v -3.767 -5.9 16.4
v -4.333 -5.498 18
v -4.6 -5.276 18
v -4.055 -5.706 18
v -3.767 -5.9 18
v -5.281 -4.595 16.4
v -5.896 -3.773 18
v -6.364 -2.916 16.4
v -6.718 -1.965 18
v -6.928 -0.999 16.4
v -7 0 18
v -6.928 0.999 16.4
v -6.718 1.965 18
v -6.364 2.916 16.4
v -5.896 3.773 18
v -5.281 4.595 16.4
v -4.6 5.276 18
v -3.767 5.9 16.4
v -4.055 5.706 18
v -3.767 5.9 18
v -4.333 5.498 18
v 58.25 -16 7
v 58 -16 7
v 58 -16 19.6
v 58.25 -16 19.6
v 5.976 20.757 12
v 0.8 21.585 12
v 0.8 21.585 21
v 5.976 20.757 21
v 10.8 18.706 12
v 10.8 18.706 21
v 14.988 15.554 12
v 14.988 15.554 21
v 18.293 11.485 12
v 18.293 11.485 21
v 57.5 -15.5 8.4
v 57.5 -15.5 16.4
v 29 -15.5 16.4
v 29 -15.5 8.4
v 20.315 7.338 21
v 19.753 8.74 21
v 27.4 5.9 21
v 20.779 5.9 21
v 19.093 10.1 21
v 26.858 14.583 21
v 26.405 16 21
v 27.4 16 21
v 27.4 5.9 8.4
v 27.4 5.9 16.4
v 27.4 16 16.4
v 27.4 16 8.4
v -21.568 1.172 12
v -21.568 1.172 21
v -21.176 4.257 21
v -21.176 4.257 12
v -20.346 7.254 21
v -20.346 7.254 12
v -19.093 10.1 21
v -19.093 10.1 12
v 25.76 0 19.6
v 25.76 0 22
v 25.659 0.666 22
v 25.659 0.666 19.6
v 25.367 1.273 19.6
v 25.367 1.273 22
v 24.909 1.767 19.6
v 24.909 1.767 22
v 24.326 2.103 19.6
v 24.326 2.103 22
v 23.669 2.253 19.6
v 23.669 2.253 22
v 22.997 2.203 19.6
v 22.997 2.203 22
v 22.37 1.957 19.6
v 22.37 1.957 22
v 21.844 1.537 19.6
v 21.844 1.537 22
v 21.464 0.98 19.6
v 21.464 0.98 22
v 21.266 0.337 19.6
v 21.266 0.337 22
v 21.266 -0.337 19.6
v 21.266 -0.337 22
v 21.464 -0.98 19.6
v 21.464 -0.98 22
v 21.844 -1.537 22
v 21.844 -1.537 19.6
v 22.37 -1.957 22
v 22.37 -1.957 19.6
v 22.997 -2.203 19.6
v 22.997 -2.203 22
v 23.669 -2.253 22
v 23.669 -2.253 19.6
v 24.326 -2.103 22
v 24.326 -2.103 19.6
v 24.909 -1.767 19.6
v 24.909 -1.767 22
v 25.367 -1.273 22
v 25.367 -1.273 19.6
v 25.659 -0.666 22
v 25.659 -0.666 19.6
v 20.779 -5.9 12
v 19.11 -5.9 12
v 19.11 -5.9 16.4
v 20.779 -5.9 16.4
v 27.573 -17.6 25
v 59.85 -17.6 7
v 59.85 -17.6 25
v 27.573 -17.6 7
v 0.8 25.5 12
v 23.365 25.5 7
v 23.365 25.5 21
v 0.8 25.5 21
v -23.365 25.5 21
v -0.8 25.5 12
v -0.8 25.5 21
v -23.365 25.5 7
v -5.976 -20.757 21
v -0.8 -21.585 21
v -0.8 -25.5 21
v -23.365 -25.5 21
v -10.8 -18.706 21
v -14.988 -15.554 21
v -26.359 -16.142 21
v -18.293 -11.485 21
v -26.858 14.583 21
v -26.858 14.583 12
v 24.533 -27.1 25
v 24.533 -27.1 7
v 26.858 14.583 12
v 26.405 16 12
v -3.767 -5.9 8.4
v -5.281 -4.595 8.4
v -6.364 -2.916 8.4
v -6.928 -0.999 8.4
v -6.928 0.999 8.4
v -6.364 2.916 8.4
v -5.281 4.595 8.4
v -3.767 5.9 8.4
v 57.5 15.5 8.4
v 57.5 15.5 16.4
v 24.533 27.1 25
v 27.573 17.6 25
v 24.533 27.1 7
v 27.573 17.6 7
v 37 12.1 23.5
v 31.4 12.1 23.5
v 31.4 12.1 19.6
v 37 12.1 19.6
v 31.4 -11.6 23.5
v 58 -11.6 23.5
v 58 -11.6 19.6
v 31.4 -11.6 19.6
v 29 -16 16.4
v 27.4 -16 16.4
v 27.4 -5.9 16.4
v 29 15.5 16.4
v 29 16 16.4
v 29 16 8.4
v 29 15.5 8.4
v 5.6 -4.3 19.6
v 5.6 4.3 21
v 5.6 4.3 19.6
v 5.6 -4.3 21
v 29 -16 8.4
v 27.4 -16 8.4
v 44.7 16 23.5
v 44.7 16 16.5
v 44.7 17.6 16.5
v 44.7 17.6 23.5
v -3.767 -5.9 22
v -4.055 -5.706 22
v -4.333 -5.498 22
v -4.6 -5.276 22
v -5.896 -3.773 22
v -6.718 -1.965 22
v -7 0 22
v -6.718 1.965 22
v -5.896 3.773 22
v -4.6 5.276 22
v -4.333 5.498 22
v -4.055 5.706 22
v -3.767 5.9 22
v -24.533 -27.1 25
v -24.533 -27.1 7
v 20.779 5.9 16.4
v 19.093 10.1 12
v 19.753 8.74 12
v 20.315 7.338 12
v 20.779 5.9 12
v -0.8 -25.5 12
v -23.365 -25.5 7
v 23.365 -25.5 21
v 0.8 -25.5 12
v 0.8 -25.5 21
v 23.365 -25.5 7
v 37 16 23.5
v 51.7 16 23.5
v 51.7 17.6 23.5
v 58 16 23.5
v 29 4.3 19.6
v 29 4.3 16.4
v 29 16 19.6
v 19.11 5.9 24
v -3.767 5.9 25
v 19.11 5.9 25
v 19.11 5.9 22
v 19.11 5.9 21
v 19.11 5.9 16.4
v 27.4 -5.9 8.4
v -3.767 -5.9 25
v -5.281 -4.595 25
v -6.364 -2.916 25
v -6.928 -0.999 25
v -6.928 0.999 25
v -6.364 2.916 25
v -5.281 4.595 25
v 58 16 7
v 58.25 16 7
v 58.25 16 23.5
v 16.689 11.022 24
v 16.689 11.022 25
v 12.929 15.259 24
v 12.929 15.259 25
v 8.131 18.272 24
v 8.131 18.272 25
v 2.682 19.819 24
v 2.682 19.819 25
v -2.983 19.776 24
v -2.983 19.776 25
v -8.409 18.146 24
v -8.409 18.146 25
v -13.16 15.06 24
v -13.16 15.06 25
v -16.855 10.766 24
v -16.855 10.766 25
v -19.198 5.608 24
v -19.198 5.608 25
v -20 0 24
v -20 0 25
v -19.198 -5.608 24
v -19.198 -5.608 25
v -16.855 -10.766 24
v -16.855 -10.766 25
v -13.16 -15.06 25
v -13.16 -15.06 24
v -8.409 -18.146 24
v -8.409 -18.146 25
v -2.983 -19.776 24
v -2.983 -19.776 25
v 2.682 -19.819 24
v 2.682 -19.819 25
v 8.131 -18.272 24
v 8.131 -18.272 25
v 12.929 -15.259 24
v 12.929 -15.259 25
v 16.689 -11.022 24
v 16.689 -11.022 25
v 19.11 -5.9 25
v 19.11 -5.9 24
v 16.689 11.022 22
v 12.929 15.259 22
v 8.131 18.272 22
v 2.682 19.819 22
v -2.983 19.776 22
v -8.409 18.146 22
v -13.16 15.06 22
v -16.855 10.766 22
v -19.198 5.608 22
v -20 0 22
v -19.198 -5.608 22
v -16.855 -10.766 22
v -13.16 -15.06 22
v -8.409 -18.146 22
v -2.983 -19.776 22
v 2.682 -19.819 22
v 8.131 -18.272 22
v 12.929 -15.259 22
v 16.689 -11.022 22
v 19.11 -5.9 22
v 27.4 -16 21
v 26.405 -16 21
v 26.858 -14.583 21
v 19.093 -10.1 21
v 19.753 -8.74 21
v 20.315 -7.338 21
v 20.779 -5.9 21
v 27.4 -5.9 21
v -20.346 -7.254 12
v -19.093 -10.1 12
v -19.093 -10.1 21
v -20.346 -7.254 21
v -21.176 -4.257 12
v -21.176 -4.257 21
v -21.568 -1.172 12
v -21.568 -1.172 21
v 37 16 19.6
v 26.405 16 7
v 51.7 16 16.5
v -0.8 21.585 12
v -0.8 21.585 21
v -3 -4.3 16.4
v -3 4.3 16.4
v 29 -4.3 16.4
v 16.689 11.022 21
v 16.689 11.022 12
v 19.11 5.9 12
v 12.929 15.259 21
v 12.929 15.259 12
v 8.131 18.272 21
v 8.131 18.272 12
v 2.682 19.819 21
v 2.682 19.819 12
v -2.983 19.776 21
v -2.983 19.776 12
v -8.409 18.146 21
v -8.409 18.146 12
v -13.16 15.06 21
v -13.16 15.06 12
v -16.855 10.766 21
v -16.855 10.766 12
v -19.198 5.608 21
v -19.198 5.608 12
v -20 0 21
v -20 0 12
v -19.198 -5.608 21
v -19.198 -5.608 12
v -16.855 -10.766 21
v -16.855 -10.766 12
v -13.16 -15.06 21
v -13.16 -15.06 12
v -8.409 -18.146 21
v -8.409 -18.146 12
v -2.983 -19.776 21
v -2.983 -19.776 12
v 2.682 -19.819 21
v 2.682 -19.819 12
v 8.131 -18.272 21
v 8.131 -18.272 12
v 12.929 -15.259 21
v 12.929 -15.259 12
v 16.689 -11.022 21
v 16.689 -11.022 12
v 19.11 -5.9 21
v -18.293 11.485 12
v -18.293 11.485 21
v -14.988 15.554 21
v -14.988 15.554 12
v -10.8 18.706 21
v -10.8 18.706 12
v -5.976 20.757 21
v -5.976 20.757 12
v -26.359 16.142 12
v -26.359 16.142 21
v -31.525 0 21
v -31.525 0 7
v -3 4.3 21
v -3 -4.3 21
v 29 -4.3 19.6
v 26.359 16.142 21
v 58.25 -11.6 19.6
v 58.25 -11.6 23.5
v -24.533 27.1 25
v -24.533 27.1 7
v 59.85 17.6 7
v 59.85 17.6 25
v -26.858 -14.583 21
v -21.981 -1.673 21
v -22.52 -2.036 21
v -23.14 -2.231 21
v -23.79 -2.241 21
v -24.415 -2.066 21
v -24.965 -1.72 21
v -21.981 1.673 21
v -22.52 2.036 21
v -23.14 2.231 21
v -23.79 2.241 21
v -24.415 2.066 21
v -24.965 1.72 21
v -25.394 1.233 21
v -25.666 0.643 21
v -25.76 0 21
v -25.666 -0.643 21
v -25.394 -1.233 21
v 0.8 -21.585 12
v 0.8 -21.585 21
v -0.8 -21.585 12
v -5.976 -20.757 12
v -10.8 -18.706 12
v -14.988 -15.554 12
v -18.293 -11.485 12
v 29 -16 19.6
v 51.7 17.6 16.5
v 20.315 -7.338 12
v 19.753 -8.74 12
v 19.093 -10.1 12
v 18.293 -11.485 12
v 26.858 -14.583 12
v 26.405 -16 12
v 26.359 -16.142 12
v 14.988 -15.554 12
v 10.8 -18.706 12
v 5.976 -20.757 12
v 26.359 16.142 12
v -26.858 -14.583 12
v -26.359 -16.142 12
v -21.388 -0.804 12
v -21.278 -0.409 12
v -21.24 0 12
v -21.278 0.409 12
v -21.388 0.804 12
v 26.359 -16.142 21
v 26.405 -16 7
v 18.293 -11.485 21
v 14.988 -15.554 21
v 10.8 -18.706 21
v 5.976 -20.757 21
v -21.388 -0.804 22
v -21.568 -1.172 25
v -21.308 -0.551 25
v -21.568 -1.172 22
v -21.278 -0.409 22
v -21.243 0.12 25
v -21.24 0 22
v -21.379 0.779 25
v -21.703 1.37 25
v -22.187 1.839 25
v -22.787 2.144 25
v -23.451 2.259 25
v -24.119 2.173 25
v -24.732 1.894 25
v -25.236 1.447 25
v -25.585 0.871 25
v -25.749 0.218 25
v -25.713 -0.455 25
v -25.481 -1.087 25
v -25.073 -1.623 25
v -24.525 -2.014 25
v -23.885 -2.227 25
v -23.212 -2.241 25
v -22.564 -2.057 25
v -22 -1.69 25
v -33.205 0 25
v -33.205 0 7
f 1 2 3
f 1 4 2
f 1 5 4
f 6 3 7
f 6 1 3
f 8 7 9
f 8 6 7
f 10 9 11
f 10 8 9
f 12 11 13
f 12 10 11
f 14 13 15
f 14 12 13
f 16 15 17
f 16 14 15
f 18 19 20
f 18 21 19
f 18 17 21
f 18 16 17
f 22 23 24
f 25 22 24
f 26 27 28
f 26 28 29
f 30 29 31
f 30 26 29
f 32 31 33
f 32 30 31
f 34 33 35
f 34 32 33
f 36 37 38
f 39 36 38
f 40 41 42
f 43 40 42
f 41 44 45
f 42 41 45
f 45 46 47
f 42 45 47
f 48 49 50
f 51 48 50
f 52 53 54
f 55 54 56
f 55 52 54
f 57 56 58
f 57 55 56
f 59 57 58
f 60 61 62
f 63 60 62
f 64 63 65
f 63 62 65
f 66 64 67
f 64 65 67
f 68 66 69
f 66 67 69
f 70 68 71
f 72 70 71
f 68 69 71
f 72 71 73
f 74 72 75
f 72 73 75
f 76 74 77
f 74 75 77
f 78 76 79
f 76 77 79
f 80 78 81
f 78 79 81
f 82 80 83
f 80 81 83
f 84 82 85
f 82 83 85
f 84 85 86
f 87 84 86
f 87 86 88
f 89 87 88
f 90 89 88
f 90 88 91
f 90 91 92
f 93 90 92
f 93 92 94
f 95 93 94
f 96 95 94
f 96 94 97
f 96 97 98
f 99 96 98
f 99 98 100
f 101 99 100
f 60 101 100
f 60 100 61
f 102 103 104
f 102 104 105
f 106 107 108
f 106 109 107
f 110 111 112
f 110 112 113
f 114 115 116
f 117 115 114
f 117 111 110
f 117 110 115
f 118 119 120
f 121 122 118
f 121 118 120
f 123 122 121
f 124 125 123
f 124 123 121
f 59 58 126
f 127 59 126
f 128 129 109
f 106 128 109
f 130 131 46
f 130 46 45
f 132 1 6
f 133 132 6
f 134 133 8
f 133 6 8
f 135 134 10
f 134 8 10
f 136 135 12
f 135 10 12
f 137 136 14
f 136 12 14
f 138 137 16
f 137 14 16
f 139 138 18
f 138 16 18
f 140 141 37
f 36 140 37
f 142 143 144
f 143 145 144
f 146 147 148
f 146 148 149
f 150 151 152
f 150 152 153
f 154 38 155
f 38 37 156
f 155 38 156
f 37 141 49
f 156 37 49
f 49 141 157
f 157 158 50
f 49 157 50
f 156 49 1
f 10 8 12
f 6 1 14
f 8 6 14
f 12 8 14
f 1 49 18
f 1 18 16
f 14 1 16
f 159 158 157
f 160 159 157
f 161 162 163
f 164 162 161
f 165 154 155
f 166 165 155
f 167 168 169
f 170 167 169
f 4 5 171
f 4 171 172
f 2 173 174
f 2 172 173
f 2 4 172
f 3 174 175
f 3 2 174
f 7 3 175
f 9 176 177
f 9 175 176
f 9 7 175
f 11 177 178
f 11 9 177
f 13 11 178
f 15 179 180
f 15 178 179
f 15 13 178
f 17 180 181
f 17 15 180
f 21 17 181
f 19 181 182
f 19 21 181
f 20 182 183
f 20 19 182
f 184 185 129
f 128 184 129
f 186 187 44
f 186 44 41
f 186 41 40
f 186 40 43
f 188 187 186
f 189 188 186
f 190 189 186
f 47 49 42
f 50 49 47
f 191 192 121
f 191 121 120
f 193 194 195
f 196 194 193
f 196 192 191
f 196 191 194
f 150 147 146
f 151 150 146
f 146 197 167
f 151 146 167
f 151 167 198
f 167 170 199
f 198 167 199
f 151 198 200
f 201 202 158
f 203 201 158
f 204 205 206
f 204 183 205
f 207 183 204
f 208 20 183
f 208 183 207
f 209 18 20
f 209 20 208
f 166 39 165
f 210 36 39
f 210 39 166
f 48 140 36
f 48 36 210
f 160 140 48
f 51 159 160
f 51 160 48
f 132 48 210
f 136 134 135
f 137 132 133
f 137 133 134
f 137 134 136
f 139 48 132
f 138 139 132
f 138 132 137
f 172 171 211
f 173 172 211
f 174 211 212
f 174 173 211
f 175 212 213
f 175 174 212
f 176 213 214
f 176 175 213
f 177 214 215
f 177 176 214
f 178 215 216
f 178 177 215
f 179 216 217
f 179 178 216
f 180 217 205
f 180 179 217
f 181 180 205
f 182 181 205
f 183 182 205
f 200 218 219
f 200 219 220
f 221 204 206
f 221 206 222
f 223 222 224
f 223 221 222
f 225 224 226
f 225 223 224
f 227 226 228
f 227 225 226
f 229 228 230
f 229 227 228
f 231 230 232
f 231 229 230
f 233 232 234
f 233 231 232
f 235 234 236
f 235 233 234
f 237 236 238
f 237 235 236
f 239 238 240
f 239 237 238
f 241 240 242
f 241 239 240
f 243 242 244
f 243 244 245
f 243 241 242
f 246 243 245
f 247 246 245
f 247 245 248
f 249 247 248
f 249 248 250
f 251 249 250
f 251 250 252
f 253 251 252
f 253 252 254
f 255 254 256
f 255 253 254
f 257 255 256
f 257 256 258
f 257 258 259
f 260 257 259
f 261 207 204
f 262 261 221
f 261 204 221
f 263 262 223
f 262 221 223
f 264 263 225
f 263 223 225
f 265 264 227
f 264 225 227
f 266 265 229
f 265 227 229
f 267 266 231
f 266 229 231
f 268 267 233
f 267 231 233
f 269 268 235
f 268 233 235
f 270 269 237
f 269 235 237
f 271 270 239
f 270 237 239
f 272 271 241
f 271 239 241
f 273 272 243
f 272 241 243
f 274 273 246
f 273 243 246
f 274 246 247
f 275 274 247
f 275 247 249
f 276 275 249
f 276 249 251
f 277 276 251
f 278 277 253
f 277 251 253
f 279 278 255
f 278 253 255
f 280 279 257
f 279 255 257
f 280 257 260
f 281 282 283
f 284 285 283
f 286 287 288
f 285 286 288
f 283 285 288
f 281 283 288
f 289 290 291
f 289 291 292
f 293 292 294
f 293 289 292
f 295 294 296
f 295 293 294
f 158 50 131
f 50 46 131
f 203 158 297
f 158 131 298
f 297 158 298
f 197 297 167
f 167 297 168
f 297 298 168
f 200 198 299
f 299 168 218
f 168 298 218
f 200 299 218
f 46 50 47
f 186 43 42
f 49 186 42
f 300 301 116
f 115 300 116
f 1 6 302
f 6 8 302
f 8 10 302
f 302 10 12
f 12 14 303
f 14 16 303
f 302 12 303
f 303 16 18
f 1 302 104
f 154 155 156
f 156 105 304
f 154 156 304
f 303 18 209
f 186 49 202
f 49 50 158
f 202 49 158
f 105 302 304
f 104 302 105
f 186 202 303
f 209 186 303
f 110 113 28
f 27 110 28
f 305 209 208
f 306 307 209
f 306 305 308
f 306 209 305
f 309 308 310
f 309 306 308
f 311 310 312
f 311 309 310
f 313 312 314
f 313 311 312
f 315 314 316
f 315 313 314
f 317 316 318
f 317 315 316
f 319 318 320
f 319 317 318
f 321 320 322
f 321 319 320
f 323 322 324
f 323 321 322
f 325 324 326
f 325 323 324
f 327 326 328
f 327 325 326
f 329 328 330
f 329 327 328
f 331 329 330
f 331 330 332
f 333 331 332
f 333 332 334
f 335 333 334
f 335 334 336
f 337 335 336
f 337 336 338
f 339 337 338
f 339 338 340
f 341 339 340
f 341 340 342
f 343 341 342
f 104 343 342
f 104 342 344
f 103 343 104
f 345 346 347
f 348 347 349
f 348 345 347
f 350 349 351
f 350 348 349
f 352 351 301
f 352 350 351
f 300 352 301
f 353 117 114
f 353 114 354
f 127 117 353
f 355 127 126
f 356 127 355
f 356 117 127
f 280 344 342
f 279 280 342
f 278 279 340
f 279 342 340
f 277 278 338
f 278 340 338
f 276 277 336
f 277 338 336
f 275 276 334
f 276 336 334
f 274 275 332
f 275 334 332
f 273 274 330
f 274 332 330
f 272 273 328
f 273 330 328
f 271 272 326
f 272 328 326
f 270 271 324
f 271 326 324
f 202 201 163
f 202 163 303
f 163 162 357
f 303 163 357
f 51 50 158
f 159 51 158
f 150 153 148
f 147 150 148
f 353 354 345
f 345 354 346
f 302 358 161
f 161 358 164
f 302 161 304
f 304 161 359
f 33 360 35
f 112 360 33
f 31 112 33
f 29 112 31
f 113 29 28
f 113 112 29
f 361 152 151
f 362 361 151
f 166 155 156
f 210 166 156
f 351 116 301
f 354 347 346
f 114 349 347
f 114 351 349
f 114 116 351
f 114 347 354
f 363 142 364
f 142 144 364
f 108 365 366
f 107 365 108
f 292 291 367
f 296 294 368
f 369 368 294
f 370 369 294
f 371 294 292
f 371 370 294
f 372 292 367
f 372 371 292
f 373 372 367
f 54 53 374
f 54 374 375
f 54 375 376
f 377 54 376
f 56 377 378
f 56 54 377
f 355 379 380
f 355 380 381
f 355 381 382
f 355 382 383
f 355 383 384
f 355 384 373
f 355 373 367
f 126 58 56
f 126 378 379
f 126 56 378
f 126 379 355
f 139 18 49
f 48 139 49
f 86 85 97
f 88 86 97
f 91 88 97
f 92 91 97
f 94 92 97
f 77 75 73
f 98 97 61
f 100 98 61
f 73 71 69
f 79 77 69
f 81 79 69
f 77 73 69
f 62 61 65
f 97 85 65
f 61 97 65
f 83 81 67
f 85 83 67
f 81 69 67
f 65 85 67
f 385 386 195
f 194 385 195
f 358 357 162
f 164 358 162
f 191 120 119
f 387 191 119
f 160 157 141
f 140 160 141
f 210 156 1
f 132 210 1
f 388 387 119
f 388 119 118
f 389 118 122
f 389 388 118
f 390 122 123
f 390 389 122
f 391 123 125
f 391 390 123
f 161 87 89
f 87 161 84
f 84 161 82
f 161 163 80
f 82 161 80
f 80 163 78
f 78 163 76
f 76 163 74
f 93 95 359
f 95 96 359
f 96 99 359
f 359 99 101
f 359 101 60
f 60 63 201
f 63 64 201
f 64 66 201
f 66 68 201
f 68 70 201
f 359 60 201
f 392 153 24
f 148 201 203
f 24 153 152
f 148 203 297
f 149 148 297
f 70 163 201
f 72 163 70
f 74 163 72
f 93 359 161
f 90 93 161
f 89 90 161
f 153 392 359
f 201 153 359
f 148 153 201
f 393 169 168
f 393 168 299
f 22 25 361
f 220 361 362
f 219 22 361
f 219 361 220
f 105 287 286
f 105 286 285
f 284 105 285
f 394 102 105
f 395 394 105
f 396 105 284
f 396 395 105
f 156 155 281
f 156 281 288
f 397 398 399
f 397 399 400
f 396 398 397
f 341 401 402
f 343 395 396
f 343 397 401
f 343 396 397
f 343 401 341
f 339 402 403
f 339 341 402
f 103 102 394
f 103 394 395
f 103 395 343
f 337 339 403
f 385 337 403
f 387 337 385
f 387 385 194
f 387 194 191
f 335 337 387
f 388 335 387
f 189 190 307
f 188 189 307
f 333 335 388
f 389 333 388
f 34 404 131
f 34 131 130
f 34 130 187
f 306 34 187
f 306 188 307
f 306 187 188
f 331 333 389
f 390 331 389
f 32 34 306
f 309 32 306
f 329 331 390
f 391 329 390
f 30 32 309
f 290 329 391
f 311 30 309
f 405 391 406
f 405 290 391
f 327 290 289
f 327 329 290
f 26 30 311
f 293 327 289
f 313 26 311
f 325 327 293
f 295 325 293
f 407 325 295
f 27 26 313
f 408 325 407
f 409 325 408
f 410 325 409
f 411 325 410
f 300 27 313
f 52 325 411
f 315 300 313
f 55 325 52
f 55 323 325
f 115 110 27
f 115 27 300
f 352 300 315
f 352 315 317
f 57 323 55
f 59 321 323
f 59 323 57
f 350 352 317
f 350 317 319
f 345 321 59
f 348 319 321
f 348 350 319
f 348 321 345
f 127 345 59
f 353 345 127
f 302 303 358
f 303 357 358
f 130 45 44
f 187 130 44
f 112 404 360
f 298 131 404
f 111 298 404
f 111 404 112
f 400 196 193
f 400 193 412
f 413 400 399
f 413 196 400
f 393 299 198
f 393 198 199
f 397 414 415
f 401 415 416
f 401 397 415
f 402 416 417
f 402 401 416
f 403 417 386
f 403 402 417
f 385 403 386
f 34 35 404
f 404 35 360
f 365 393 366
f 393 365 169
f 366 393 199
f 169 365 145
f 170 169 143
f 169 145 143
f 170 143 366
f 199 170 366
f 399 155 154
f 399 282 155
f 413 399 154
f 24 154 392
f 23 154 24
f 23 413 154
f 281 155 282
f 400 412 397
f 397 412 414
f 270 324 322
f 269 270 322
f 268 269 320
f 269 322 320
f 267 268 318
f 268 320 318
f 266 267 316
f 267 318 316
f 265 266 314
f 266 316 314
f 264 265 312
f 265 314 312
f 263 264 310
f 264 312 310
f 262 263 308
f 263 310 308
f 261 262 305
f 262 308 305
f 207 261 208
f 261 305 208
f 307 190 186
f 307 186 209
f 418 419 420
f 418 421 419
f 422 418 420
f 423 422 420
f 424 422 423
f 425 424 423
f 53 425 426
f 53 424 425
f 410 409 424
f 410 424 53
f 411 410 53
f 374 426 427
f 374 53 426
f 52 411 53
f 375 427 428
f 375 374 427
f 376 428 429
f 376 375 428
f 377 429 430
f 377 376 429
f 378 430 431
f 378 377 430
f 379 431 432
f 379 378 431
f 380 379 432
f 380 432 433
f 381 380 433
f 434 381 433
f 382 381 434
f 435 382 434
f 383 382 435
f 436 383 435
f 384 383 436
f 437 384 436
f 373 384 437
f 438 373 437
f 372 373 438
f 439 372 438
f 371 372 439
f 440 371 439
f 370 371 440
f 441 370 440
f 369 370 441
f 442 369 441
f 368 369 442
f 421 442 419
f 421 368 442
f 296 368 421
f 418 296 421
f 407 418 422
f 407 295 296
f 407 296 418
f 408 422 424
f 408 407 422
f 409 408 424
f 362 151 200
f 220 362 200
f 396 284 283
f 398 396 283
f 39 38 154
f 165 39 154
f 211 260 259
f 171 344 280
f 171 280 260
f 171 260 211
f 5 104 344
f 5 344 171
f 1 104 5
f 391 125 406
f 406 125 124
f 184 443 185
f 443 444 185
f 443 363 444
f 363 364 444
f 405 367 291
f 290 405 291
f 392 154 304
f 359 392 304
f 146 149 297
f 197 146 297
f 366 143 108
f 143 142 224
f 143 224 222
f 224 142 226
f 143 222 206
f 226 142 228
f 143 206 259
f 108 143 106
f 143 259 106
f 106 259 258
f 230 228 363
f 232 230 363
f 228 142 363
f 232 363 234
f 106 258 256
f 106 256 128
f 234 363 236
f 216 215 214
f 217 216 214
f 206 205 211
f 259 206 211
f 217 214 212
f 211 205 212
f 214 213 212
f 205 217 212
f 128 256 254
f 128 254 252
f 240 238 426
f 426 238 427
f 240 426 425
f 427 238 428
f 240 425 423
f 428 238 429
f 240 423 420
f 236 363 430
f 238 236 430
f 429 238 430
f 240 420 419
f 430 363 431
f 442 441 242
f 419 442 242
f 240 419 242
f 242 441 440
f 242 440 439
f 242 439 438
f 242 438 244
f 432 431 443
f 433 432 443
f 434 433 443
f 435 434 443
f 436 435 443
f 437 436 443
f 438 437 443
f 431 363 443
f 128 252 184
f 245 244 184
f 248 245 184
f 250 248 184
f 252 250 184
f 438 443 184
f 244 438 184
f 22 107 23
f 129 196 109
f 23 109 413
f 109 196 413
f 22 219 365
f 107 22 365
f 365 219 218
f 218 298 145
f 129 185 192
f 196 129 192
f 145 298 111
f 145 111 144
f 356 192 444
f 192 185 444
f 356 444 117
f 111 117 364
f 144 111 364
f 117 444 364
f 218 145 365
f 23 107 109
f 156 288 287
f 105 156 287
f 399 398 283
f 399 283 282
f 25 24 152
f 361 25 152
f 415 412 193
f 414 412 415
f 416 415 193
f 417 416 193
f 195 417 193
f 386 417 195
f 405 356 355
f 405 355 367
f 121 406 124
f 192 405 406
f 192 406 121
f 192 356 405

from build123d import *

# Parameters (mm, degrees)
BOSS_EXTRUDE1_DEPTH      = 10
BOSS_EXTRUDE1_DEPTH_BACK = 5
BOSS_EXTRUDE2_DEPTH      = 15
CUT_EXTRUDE1_DEPTH       = 68.168221653
BOSS_EXTRUDE3_DEPTH      = 4
SKETCH7_R                = 1.75
BOSS_EXTRUDE4_DEPTH      = 2.4
SKETCH8_R                = 3.5
BOSS_EXTRUDE5_DEPTH      = 1
CUT_EXTRUDE2_DEPTH       = 10
BOSS_EXTRUDE7_START      = 14
BOSS_EXTRUDE7_DEPTH      = 14
RIB9_START               = -9
RIB9_DEPTH               = 9
CUT_EXTRUDE3_DEPTH       = 5
SKETCH18_R               = 2.259673145
CUT_EXTRUDE4_DEPTH       = 68.168221653
SKETCH20_R               = 3.5
SKETCH20_W               = 8.6
SKETCH20_H               = 8.6
BOSS_EXTRUDE8_DEPTH      = 1
SKETCH21_W               = 7
SKETCH21_H               = 1.6
CUT_EXTRUDE5_DEPTH       = 7
BOSS_EXTRUDE11_DEPTH     = 2
SKETCH25_W               = 26.6
SKETCH25_H               = 26.1
BOSS_EXTRUDE12_DEPTH     = 1
BOSS_EXTRUDE13_DEPTH     = 4
CUT_EXTRUDE6_START       = -4
CUT_EXTRUDE6_DEPTH       = 4
BOSS_EXTRUDE14_DEPTH     = 1.6
BOSS_EXTRUDE16_START     = 2
SKETCH30_R               = 2.259673145
BOSS_EXTRUDE16_DEPTH     = 2
MOVE_FACE2_BY            = 2.8
MOVE_FACE2_2_BY          = 2.8
MOVE_START               = 14.5
MOVE_FACE3_OUTLINE_W     = 7
MOVE_FACE3_OUTLINE_H     = 1.5
MOVE_FACE3_DEPTH         = 1.6
MOVE_FACE3_2_OUTLINE_W   = 7
MOVE_FACE3_2_OUTLINE_H   = 1.5
MOVE_FACE3_2_DEPTH       = 1.6
MOVE_START_2             = 7
MOVE_FACE4_OUTLINE_W     = 29
MOVE_FACE4_OUTLINE_H     = 1.5
MOVE_FACE4_DEPTH         = 12.6
MOVE_START_3             = 19.6
MOVE_FACE4_2_OUTLINE_W   = 7.7
MOVE_FACE4_2_OUTLINE_H   = 1.5
MOVE_FACE4_2_OUTLINE_W_2 = 6.3
MOVE_FACE4_2_DEPTH       = 3.4
MOVE_FACE4_3_OUTLINE_W   = 1.6
MOVE_FACE4_3_OUTLINE_H   = 1.5
MOVE_FACE4_3_DEPTH       = 9.4
MOVE_FACE4_4_DEPTH       = 1.4
MOVE_FACE4_5_OUTLINE_W   = 7.9
MOVE_FACE4_5_OUTLINE_H   = 1.5
MOVE_FACE4_5_DEPTH       = 17
MOVE_FACE4_6_OUTLINE_W   = 7
MOVE_FACE4_6_OUTLINE_H   = 1.5
MOVE_FACE4_6_DEPTH       = 9.5
MOVE_START_4             = 23.5
MOVE_FACE4_7_OUTLINE_W   = 7
MOVE_FACE4_7_OUTLINE_H   = 1.5
MOVE_FACE4_7_DEPTH       = 0.5
MOVE_FACE6_OUTLINE_W     = 29
MOVE_FACE6_OUTLINE_H     = 1.5
MOVE_FACE6_DEPTH         = 12.6
MOVE_FACE6_2_OUTLINE_W   = 1.6
MOVE_FACE6_2_OUTLINE_H   = 1.5
MOVE_FACE6_2_DEPTH       = 9.4
MOVE_FACE6_3_DEPTH       = 1.4
MOVE_FACE6_4_DEPTH       = 17
BOSS_EXTRUDE17_DEPTH     = 8
MOVE_START_5             = 31.4
MOVE_FACE8_OUTLINE_W     = 23.7
MOVE_FACE8_OUTLINE_H     = 0.5
MOVE_FACE8_DEPTH         = 26.6
MOVE_START_6             = 37
MOVE_FACE8_2_OUTLINE_W   = 3.9
MOVE_FACE8_2_OUTLINE_H   = 0.5
MOVE_FACE8_2_DEPTH       = 21
MOVE_FACE9_BY            = 1
MOVE_FACE10_BY           = 0.25
MOVE_FACE10_2_BY         = 0.25


# Read off the part's stored shape, not the designer's step: Rib9, Move Face3, Move Face4, Move Face6, Move Face8
with BuildPart() as part:
    # Sketch2 → Boss-Extrude1 (new, two sides: drawn at the far end of the back side and taken through both)
    with BuildSketch(Plane.XY.offset(12).offset(-BOSS_EXTRUDE1_DEPTH_BACK)):
        Polygon((-24.532899998, 27.1), (-33.204899998, 0), (-24.532899998, -27.1), (24.532899998, -27.1), (33.204899998, 0), (24.532899998, 27.1), align=None)
        Polygon((-23.36497619, 25.5), (-31.52497619, 0), (-23.36497619, -25.5), (23.36497619, -25.5), (31.52497619, 0), (23.36497619, 25.5), align=None, mode=Mode.SUBTRACT)
    extrude(amount=BOSS_EXTRUDE1_DEPTH + BOSS_EXTRUDE1_DEPTH_BACK)

    # Sketch3 → Boss-Extrude2 (add)
    with BuildSketch(Plane.XY.offset(22)):
        Polygon((29.5, 16.1), (59.6, 16.1), (59.6, -16.1), (29.5, -16.1), (28.052899998, -16.1), (28.564899998, -14.5), (29.5, -14.5), (58, -14.5), (58, 14.5), (29.5, 14.5), (28.564899998, 14.5), (28.052899998, 16.1), align=None)
    extrude(amount=-BOSS_EXTRUDE2_DEPTH)

    # Sketch4 → Cut-Extrude1 (cut, through all)
    with BuildSketch(Plane(origin=(0, 0, 7), x_dir=(-1, 0, 0), z_dir=(0, 0, -1))):
        Polygon((-26.88497619, 14.5), (-28.564899998, 14.5), (-33.204899998, 0), (-28.564899998, -14.5), (-26.88497619, -14.5), (-31.52497619, 0), align=None)
    extrude(amount=-CUT_EXTRUDE1_DEPTH, mode=Mode.SUBTRACT)

    # Sketch5 → Boss-Extrude3 (add)
    with BuildSketch(Plane.XY.offset(22)):
        Polygon((29, 4.3), (29, 14), (29, 14.5), (27.4, 14.5), (27.4, 14), (27.4, 5.9), (-4.6, 5.9), (-4.6, -5.9), (27.4, -5.9), (27.4, -14), (27.4, -14.5), (29, -14.5), (29, -14), (29, -4.3), (-3, -4.3), (-3, 4.3), align=None)
    extrude(amount=-BOSS_EXTRUDE3_DEPTH)

    # Sketch7 → Boss-Extrude4 (add)
    with BuildSketch(Plane.XY.offset(22)):
        Polygon((37, 12.1), (37, 14.5), (29, 14.5), (29, 4.3), (5.6, 4.3), (5.6, -4.3), (29, -4.3), (29, -14.5), (58, -14.5), (58, -11.6), (31.4, -11.6), (31.4, 12.1), align=None)
        with Locations((23.5, 0)):
            Circle(SKETCH7_R, mode=Mode.SUBTRACT)
    extrude(amount=-BOSS_EXTRUDE4_DEPTH)

    # Sketch8 → Boss-Extrude5 (add)
    with BuildSketch(Plane.XY.offset(22)):
        Polygon((27.4, -5.9), (27.4, -14.5), (26.88497619, -14.5), (23.36497619, -25.5), (-23.36497619, -25.5), (-31.52497619, 0), (-23.36497619, 25.5), (23.36497619, 25.5), (26.88497619, 14.5), (27.4, 14.5), (27.4, 5.9), (-4.6, 5.9), (-4.6, -5.9), align=None)
        with Locations((-18.25, 18.25)):
            Circle(SKETCH8_R, mode=Mode.SUBTRACT)
        with Locations((18.25, 18.25)):
            Circle(SKETCH8_R, mode=Mode.SUBTRACT)
        with Locations((18.25, -18.25)):
            Circle(SKETCH8_R, mode=Mode.SUBTRACT)
        with Locations((-18.25, -18.25)):
            Circle(SKETCH8_R, mode=Mode.SUBTRACT)
    extrude(amount=-BOSS_EXTRUDE5_DEPTH)

    # Sketch11 → Cut-Extrude2 (cut)
    with BuildSketch(Plane(origin=(0, 0, 21), x_dir=(-1, 0, 0), z_dir=(0, 0, -1))):
        with BuildLine():
            Line((4.6, -5.9), (-19.109945055, -5.9))
            ThreePointArc((-19.109945055, -5.9), (2.983378865, -19.776234489), (20, 0))
            ThreePointArc((20, 0), (2.983378865, 19.776234489), (-19.109945055, 5.9))
            Line((-19.109945055, 5.9), (4.6, 5.9))
            Line((4.6, 5.9), (4.6, -5.9))
        make_face()
    extrude(amount=-CUT_EXTRUDE2_DEPTH, mode=Mode.SUBTRACT)

    # Sketch12 → Boss-Extrude7 (add)
    with BuildSketch(Plane(origin=(0, 0, 21), x_dir=(-1, 0, 0), z_dir=(0, 0, -1)).offset(BOSS_EXTRUDE7_START)):
        with BuildLine():
            ThreePointArc((21.6, 0), (2.978452055, 21.393663159), (-20.778594755, 5.9))
            Line((-20.778594755, 5.9), (-19.109945055, 5.9))
            ThreePointArc((-19.109945055, 5.9), (20, 0), (-19.109945055, -5.9))
            Line((-19.109945055, -5.9), (-20.778594755, -5.9))
            ThreePointArc((-20.778594755, -5.9), (2.978452055, -21.393663159), (21.6, 0))
        make_face()
    extrude(amount=-BOSS_EXTRUDE7_DEPTH)

    # Rib9 outline → Rib9 (add)
    with BuildSketch(Plane(origin=(0, 0, 12), x_dir=(-1, 0, 0), z_dir=(0, 0, -1)).offset(RIB9_START)):
        with BuildLine():
            ThreePointArc((-0.8, 21.585180101), (0, 21.6), (0.8, 21.585180101))
            Line((0.8, 21.585180101), (0.8, 25.5))
            Line((0.8, 25.5), (-0.8, 25.5))
            Line((-0.8, 25.5), (-0.8, 21.585180101))
        make_face()
        with BuildLine():
            Line((26.359415795, 16.142376235), (18.293314313, 11.485410374))
            ThreePointArc((18.293314313, 11.485410374), (18.706148722, 10.8), (19.093314313, 10.099769728))
            Line((19.093314313, 10.099769728), (26.85842878, 14.582960656))
            Line((26.85842878, 14.582960656), (26.359415795, 16.142376235))
        make_face()
        with BuildLine():
            ThreePointArc((-19.093314313, 10.099769728), (-18.706148721, 10.8), (-18.293314313, 11.485410374))
            Line((-18.293314313, 11.485410374), (-26.359415795, 16.142376235))
            Line((-26.359415795, 16.142376235), (-26.85842878, 14.582960656))
            Line((-26.85842878, 14.582960656), (-19.093314313, 10.099769728))
        make_face()
        with BuildLine():
            Line((26.85842878, -14.582960656), (19.093314313, -10.099769728))
            ThreePointArc((19.093314313, -10.099769728), (18.706148722, -10.8), (18.293314313, -11.485410374))
            Line((18.293314313, -11.485410374), (26.359415795, -16.142376235))
            Line((26.359415795, -16.142376235), (26.85842878, -14.582960656))
        make_face()
        with BuildLine():
            Line((0.8, -25.5), (0.8, -21.585180101))
            ThreePointArc((0.8, -21.585180101), (0, -21.6), (-0.8, -21.585180101))
            Line((-0.8, -21.585180101), (-0.8, -25.5))
            Line((-0.8, -25.5), (0.8, -25.5))
        make_face()
        with BuildLine():
            Line((-26.359415795, -16.142376235), (-18.293314313, -11.485410374))
            ThreePointArc((-18.293314313, -11.485410374), (-18.706148721, -10.8), (-19.093314313, -10.099769728))
            Line((-19.093314313, -10.099769728), (-26.85842878, -14.582960656))
            Line((-26.85842878, -14.582960656), (-26.359415795, -16.142376235))
        make_face()
    extrude(amount=RIB9_DEPTH)

    # Sketch17 → Cut-Extrude3 (cut)
    with BuildSketch(Plane(origin=(0, 0, 7), x_dir=(-1, 0, 0), z_dir=(0, 0, -1))):
        with BuildLine():
            Line((-19.109945055, -5.9), (-20.778594755, -5.9))
            ThreePointArc((-20.778594755, -5.9), (21.6, 0), (-20.778594755, 5.9))
            Line((-20.778594755, 5.9), (-19.109945055, 5.9))
            ThreePointArc((-19.109945055, 5.9), (20, 0), (-19.109945055, -5.9))
        make_face()
    extrude(amount=-CUT_EXTRUDE3_DEPTH, mode=Mode.SUBTRACT)

    # Sketch18 → Cut-Extrude4 (cut, through all)
    with BuildSketch(Plane.XY.offset(22)):
        with Locations((-23.5, 0)):
            Circle(SKETCH18_R)
        with Locations((23.5, 0)):
            Circle(SKETCH18_R)
    extrude(amount=-CUT_EXTRUDE4_DEPTH, mode=Mode.SUBTRACT)

    # Sketch20 → Boss-Extrude8 (add)
    with BuildSketch(Plane.XY.offset(22)):
        with Locations((18.25, 18.25)):
            Circle(SKETCH20_R)
        with Locations((18.25, -18.25)):
            Circle(SKETCH20_R)
        with Locations((-18.25, -18.25)):
            Circle(SKETCH20_R)
        with Locations((-18.25, 18.25)):
            Circle(SKETCH20_R)
        with Locations((1.3, 0)):
            Rectangle(SKETCH20_W, SKETCH20_H)
    extrude(amount=-BOSS_EXTRUDE8_DEPTH)

    # Sketch21 → Cut-Extrude5 (cut)
    with BuildSketch(Plane.XY.offset(22)):
        with Locations((51, 15.3)):
            Rectangle(SKETCH21_W, SKETCH21_H)
    extrude(amount=-CUT_EXTRUDE5_DEPTH, mode=Mode.SUBTRACT)

    # Sketch26 → Boss-Extrude13 (add)
    with BuildSketch(Plane.XY.offset(22)):
        with BuildLine():
            ThreePointArc((-7, 0), (-6.371812929, -2.898275349), (-4.6, -5.276362383))
            Line((-4.6, -5.276362383), (-4.6, 0))
            Line((-4.6, 0), (-7, 0))
        make_face()
        with BuildLine():
            Line((-7, 0), (-4.6, 0))
            Line((-4.6, 0), (-4.6, 5.276362383))
            ThreePointArc((-4.6, 5.276362383), (-6.371812929, 2.898275349), (-7, 0))
        make_face()
    extrude(amount=-BOSS_EXTRUDE13_DEPTH)

    # Sketch28 → Cut-Extrude6 (cut)
    with BuildSketch(Plane(origin=(0, 0, 18), x_dir=(-1, 0, 0), z_dir=(0, 0, -1)).offset(CUT_EXTRUDE6_START)):
        with BuildLine():
            ThreePointArc((3.76696164, 5.9), (4.195085546, 5.603682473), (4.6, 5.276362383))
            Line((4.6, 5.276362383), (4.6, 5.9))
            Line((4.6, 5.9), (3.76696164, 5.9))
        make_face()
        with BuildLine():
            Line((3.76696164, -5.9), (4.6, -5.9))
            Line((4.6, -5.9), (4.6, -5.276362383))
            ThreePointArc((4.6, -5.276362383), (4.195085546, -5.603682473), (3.76696164, -5.9))
        make_face()
    extrude(amount=CUT_EXTRUDE6_DEPTH, mode=Mode.SUBTRACT)

    # Sketch29 → Boss-Extrude14 (add)
    with BuildSketch(Plane(origin=(0, 0, 18), x_dir=(-1, 0, 0), z_dir=(0, 0, -1))):
        with BuildLine():
            Line((3.76696164, 5.9), (-19.109945055, 5.9))
            Line((-19.109945055, 5.9), (-20.778594755, 5.9))
            Line((-20.778594755, 5.9), (-27.4, 5.9))
            Line((-27.4, 5.9), (-27.4, 14.5))
            Line((-27.4, 14.5), (-29, 14.5))
            Line((-29, 14.5), (-29, 4.3))
            Line((-29, 4.3), (3, 4.3))
            Line((3, 4.3), (3, -4.3))
            Line((3, -4.3), (-29, -4.3))
            Line((-29, -4.3), (-29, -14.5))
            Line((-29, -14.5), (-27.4, -14.5))
            Line((-27.4, -14.5), (-27.4, -5.9))
            Line((-27.4, -5.9), (-20.778594755, -5.9))
            Line((-20.778594755, -5.9), (-19.109945055, -5.9))
            Line((-19.109945055, -5.9), (3.76696164, -5.9))
            ThreePointArc((3.76696164, -5.9), (7, 0), (3.76696164, 5.9))
        make_face()
    extrude(amount=BOSS_EXTRUDE14_DEPTH)



with BuildPart() as body_2:
    # Sketch24 → Boss-Extrude11 (new body)
    with BuildSketch(Plane.XY.offset(22)):
        Polygon((59.6, 16.1), (29.8, 16.1), (29.8, 12.1), (29.8, -13.2), (59.6, -13.2), align=None)
        Polygon((58, 14.5), (58, -11.6), (31.4, -11.6), (31.4, 12.1), (31.4, 14.5), align=None, mode=Mode.SUBTRACT)
    extrude(amount=BOSS_EXTRUDE11_DEPTH)

    # Sketch25 → Boss-Extrude12 (add)
    with BuildSketch(Plane.XY.offset(24)):
        with Locations((44.7, 1.45)):
            Rectangle(SKETCH25_W, SKETCH25_H)
    extrude(amount=-BOSS_EXTRUDE12_DEPTH)


with BuildPart() as part_1:
    add(part.part)

    add(body_2.part)  # Boss-Extrude16 merges body 2
    # Sketch30 → Boss-Extrude16 (add)
    with BuildSketch(Plane.XY.offset(22).offset(BOSS_EXTRUDE16_START)):
        Polygon((54.5, 16.1), (54.5, 14.5), (58, 14.5), (58, -11.6), (31.4, -11.6), (31.4, 12.1), (37, 12.1), (37, 14.5), (47.5, 14.5), (47.5, 16.1), (28.052899998, 16.1), (24.532899998, 27.1), (-24.532899998, 27.1), (-33.204899998, 0), (-24.532899998, -27.1), (24.532899998, -27.1), (28.052899998, -16.1), (59.6, -16.1), (59.6, 16.1), align=None)
        with Locations(Location((-23.5, 0, 0), (0, 0, 328.750537773))):
            Circle(SKETCH30_R, mode=Mode.SUBTRACT)
        with BuildLine():
            Line((-3.76696164, 5.9), (19.109945055, 5.9))
            ThreePointArc((19.109945055, 5.9), (-20, 0), (19.109945055, -5.9))
            Line((19.109945055, -5.9), (-3.76696164, -5.9))
            ThreePointArc((-3.76696164, -5.9), (-7, 0), (-3.76696164, 5.9))
        make_face(mode=Mode.SUBTRACT)
    extrude(amount=-BOSS_EXTRUDE16_DEPTH)

    # Move Face2: a face moved outward by 2.8
    extrude(part_1.faces().sort_by_distance((54.5, 15.3, 18.5))[0], amount=MOVE_FACE2_BY, dir=(-1, 0, 0))

    # Move Face2 2: a face moved inward by 2.8
    extrude(part_1.faces().sort_by_distance((47.5, 15.3, 18.5))[0], amount=MOVE_FACE2_2_BY, dir=(-1, 0, 0), mode=Mode.SUBTRACT)

    # Move Face3 outline → Move Face3 (cut)
    with BuildSketch(Plane(origin=(0, 0, 0), x_dir=(1, 0, 0), z_dir=(0, 1, 0)).offset(MOVE_START)):
        with Locations((48.2, -22.75)):
            Rectangle(MOVE_FACE3_OUTLINE_W, MOVE_FACE3_OUTLINE_H)
    extrude(amount=MOVE_FACE3_DEPTH, mode=Mode.SUBTRACT)

    # Move Face3 2 outline → Move Face3 2 (add)
    with BuildSketch(Plane(origin=(0, 0, 0), x_dir=(1, 0, 0), z_dir=(0, 1, 0)).offset(MOVE_START)):
        with Locations((48.2, -15.75)):
            Rectangle(MOVE_FACE3_2_OUTLINE_W, MOVE_FACE3_2_OUTLINE_H)
    extrude(amount=MOVE_FACE3_2_DEPTH)

    # Move Face4 outline → Move Face4 (cut)
    with BuildSketch(Plane.XY.offset(MOVE_START_2)):
        Polygon((26.40497619, 16), (26.85842878, 14.582960656), (26.88497619, 14.5), (27.4, 14.5), (27.4, 16), align=None)
        with Locations((43.5, 15.25)):
            Rectangle(MOVE_FACE4_OUTLINE_W, MOVE_FACE4_OUTLINE_H)
    extrude(amount=MOVE_FACE4_DEPTH, mode=Mode.SUBTRACT)

    # Move Face4 2 outline → Move Face4 2 (cut)
    with BuildSketch(Plane.XY.offset(MOVE_START_3)):
        with Locations((40.85, 15.25)):
            Rectangle(MOVE_FACE4_2_OUTLINE_W, MOVE_FACE4_2_OUTLINE_H)
        with Locations((54.85, 15.25)):
            Rectangle(MOVE_FACE4_2_OUTLINE_W_2, MOVE_FACE4_2_OUTLINE_H)
    extrude(amount=MOVE_FACE4_2_DEPTH, mode=Mode.SUBTRACT)

    # Move Face4 3 outline → Move Face4 3 (cut)
    with BuildSketch(Plane.XY.offset(MOVE_START_2)):
        with Locations((28.2, 15.25)):
            Rectangle(MOVE_FACE4_3_OUTLINE_W, MOVE_FACE4_3_OUTLINE_H)
    extrude(amount=MOVE_FACE4_3_DEPTH, mode=Mode.SUBTRACT)

    # Move Face4 4 outline → Move Face4 4 (cut)
    with BuildSketch(Plane.XY.offset(MOVE_START_3)):
        Polygon((26.40497619, 16), (26.85842878, 14.582960656), (26.88497619, 14.5), (27.4, 14.5), (27.4, 16), align=None)
    extrude(amount=MOVE_FACE4_4_DEPTH, mode=Mode.SUBTRACT)

    # Move Face4 5 outline → Move Face4 5 (add)
    with BuildSketch(Plane.XY.offset(MOVE_START_2)):
        Polygon((28.052899998, 16.1), (44.7, 16.1), (44.7, 17.6), (27.572899998, 17.6), align=None)
        with Locations((55.65, 16.85)):
            Rectangle(MOVE_FACE4_5_OUTLINE_W, MOVE_FACE4_5_OUTLINE_H)
    extrude(amount=MOVE_FACE4_5_DEPTH)

    # Move Face4 6 outline → Move Face4 6 (add)
    with BuildSketch(Plane.XY.offset(MOVE_START_2)):
        with Locations((48.2, 16.85)):
            Rectangle(MOVE_FACE4_6_OUTLINE_W, MOVE_FACE4_6_OUTLINE_H)
    extrude(amount=MOVE_FACE4_6_DEPTH)

    # Move Face4 7 outline → Move Face4 7 (add)
    with BuildSketch(Plane.XY.offset(MOVE_START_4)):
        with Locations((48.2, 16.85)):
            Rectangle(MOVE_FACE4_7_OUTLINE_W, MOVE_FACE4_7_OUTLINE_H)
    extrude(amount=MOVE_FACE4_7_DEPTH)

    # Move Face6 outline → Move Face6 (cut)
    with BuildSketch(Plane.XY.offset(MOVE_START_2)):
        Polygon((26.85842878, -14.582960656), (26.40497619, -16), (27.4, -16), (27.4, -14.5), (26.88497619, -14.5), align=None)
        with Locations((43.5, -15.25)):
            Rectangle(MOVE_FACE6_OUTLINE_W, MOVE_FACE6_OUTLINE_H)
    extrude(amount=MOVE_FACE6_DEPTH, mode=Mode.SUBTRACT)

    # Move Face6 2 outline → Move Face6 2 (cut)
    with BuildSketch(Plane.XY.offset(MOVE_START_2)):
        with Locations((28.2, -15.25)):
            Rectangle(MOVE_FACE6_2_OUTLINE_W, MOVE_FACE6_2_OUTLINE_H)
    extrude(amount=MOVE_FACE6_2_DEPTH, mode=Mode.SUBTRACT)

    # Move Face6 3 outline → Move Face6 3 (cut)
    with BuildSketch(Plane.XY.offset(MOVE_START_3)):
        Polygon((26.85842878, -14.582960656), (26.40497619, -16), (27.4, -16), (27.4, -14.5), (26.88497619, -14.5), align=None)
    extrude(amount=MOVE_FACE6_3_DEPTH, mode=Mode.SUBTRACT)

    # Move Face6 4 outline → Move Face6 4 (add)
    with BuildSketch(Plane.XY.offset(MOVE_START_2)):
        Polygon((27.572899998, -17.6), (59.6, -17.6), (59.6, -16.1), (28.052899998, -16.1), align=None)
    extrude(amount=MOVE_FACE6_4_DEPTH)

    # Move Face8 outline → Move Face8 (cut)
    with BuildSketch(Plane.YZ.offset(MOVE_START_5)):
        with Locations((0.25, 23.25)):
            Rectangle(MOVE_FACE8_OUTLINE_W, MOVE_FACE8_OUTLINE_H)
    extrude(amount=MOVE_FACE8_DEPTH, mode=Mode.SUBTRACT)

    # Move Face8 2 outline → Move Face8 2 (cut)
    with BuildSketch(Plane.YZ.offset(MOVE_START_6)):
        with Locations((14.05, 23.25)):
            Rectangle(MOVE_FACE8_2_OUTLINE_W, MOVE_FACE8_2_OUTLINE_H)
    extrude(amount=MOVE_FACE8_2_DEPTH, mode=Mode.SUBTRACT)

    # Move Face9: a face moved outward by 1.0
    extrude(part_1.faces().sort_by_distance((15.261438499, 0, 24))[0], amount=MOVE_FACE9_BY, dir=(0, 0, 1))

    # Move Face10: a face moved outward by 0.25
    extrude(part_1.faces().sort_by_distance((59.6, 0, 16))[0], amount=MOVE_FACE10_BY, dir=(1, 0, 0))

    # Move Face10 2: a face moved inward by 0.25
    extrude(part_1.faces().sort_by_distance((58, 0.463565891, 15.038372093))[0], amount=MOVE_FACE10_2_BY, dir=(1, 0, 0), mode=Mode.SUBTRACT)


with BuildPart() as body_2_2:
    # Sketch38 → Boss-Extrude17 (new body)
    with BuildSketch(Plane(origin=(0, 0, 16.4), x_dir=(-1, 0, 0), z_dir=(0, 0, -1))):
        with BuildLine():
            Line((-57.5, -15.5), (-29, -15.5))
            Line((-29, -15.5), (-29, -16))
            Line((-29, -16), (-27.4, -16))
            Line((-27.4, -16), (-27.4, -5.9))
            Line((-27.4, -5.9), (3.76696164, -5.9))
            ThreePointArc((3.76696164, -5.9), (7, 0), (3.76696164, 5.9))
            Line((3.76696164, 5.9), (-27.4, 5.9))
            Line((-27.4, 5.9), (-27.4, 16))
            Line((-27.4, 16), (-29, 16))
            Line((-29, 16), (-29, 15.5))
            Line((-29, 15.5), (-57.5, 15.5))
            Line((-57.5, 15.5), (-57.5, -15.5))
        make_face()
    extrude(amount=BOSS_EXTRUDE17_DEPTH)


solid = Compound([part_1.part, body_2_2.part])
